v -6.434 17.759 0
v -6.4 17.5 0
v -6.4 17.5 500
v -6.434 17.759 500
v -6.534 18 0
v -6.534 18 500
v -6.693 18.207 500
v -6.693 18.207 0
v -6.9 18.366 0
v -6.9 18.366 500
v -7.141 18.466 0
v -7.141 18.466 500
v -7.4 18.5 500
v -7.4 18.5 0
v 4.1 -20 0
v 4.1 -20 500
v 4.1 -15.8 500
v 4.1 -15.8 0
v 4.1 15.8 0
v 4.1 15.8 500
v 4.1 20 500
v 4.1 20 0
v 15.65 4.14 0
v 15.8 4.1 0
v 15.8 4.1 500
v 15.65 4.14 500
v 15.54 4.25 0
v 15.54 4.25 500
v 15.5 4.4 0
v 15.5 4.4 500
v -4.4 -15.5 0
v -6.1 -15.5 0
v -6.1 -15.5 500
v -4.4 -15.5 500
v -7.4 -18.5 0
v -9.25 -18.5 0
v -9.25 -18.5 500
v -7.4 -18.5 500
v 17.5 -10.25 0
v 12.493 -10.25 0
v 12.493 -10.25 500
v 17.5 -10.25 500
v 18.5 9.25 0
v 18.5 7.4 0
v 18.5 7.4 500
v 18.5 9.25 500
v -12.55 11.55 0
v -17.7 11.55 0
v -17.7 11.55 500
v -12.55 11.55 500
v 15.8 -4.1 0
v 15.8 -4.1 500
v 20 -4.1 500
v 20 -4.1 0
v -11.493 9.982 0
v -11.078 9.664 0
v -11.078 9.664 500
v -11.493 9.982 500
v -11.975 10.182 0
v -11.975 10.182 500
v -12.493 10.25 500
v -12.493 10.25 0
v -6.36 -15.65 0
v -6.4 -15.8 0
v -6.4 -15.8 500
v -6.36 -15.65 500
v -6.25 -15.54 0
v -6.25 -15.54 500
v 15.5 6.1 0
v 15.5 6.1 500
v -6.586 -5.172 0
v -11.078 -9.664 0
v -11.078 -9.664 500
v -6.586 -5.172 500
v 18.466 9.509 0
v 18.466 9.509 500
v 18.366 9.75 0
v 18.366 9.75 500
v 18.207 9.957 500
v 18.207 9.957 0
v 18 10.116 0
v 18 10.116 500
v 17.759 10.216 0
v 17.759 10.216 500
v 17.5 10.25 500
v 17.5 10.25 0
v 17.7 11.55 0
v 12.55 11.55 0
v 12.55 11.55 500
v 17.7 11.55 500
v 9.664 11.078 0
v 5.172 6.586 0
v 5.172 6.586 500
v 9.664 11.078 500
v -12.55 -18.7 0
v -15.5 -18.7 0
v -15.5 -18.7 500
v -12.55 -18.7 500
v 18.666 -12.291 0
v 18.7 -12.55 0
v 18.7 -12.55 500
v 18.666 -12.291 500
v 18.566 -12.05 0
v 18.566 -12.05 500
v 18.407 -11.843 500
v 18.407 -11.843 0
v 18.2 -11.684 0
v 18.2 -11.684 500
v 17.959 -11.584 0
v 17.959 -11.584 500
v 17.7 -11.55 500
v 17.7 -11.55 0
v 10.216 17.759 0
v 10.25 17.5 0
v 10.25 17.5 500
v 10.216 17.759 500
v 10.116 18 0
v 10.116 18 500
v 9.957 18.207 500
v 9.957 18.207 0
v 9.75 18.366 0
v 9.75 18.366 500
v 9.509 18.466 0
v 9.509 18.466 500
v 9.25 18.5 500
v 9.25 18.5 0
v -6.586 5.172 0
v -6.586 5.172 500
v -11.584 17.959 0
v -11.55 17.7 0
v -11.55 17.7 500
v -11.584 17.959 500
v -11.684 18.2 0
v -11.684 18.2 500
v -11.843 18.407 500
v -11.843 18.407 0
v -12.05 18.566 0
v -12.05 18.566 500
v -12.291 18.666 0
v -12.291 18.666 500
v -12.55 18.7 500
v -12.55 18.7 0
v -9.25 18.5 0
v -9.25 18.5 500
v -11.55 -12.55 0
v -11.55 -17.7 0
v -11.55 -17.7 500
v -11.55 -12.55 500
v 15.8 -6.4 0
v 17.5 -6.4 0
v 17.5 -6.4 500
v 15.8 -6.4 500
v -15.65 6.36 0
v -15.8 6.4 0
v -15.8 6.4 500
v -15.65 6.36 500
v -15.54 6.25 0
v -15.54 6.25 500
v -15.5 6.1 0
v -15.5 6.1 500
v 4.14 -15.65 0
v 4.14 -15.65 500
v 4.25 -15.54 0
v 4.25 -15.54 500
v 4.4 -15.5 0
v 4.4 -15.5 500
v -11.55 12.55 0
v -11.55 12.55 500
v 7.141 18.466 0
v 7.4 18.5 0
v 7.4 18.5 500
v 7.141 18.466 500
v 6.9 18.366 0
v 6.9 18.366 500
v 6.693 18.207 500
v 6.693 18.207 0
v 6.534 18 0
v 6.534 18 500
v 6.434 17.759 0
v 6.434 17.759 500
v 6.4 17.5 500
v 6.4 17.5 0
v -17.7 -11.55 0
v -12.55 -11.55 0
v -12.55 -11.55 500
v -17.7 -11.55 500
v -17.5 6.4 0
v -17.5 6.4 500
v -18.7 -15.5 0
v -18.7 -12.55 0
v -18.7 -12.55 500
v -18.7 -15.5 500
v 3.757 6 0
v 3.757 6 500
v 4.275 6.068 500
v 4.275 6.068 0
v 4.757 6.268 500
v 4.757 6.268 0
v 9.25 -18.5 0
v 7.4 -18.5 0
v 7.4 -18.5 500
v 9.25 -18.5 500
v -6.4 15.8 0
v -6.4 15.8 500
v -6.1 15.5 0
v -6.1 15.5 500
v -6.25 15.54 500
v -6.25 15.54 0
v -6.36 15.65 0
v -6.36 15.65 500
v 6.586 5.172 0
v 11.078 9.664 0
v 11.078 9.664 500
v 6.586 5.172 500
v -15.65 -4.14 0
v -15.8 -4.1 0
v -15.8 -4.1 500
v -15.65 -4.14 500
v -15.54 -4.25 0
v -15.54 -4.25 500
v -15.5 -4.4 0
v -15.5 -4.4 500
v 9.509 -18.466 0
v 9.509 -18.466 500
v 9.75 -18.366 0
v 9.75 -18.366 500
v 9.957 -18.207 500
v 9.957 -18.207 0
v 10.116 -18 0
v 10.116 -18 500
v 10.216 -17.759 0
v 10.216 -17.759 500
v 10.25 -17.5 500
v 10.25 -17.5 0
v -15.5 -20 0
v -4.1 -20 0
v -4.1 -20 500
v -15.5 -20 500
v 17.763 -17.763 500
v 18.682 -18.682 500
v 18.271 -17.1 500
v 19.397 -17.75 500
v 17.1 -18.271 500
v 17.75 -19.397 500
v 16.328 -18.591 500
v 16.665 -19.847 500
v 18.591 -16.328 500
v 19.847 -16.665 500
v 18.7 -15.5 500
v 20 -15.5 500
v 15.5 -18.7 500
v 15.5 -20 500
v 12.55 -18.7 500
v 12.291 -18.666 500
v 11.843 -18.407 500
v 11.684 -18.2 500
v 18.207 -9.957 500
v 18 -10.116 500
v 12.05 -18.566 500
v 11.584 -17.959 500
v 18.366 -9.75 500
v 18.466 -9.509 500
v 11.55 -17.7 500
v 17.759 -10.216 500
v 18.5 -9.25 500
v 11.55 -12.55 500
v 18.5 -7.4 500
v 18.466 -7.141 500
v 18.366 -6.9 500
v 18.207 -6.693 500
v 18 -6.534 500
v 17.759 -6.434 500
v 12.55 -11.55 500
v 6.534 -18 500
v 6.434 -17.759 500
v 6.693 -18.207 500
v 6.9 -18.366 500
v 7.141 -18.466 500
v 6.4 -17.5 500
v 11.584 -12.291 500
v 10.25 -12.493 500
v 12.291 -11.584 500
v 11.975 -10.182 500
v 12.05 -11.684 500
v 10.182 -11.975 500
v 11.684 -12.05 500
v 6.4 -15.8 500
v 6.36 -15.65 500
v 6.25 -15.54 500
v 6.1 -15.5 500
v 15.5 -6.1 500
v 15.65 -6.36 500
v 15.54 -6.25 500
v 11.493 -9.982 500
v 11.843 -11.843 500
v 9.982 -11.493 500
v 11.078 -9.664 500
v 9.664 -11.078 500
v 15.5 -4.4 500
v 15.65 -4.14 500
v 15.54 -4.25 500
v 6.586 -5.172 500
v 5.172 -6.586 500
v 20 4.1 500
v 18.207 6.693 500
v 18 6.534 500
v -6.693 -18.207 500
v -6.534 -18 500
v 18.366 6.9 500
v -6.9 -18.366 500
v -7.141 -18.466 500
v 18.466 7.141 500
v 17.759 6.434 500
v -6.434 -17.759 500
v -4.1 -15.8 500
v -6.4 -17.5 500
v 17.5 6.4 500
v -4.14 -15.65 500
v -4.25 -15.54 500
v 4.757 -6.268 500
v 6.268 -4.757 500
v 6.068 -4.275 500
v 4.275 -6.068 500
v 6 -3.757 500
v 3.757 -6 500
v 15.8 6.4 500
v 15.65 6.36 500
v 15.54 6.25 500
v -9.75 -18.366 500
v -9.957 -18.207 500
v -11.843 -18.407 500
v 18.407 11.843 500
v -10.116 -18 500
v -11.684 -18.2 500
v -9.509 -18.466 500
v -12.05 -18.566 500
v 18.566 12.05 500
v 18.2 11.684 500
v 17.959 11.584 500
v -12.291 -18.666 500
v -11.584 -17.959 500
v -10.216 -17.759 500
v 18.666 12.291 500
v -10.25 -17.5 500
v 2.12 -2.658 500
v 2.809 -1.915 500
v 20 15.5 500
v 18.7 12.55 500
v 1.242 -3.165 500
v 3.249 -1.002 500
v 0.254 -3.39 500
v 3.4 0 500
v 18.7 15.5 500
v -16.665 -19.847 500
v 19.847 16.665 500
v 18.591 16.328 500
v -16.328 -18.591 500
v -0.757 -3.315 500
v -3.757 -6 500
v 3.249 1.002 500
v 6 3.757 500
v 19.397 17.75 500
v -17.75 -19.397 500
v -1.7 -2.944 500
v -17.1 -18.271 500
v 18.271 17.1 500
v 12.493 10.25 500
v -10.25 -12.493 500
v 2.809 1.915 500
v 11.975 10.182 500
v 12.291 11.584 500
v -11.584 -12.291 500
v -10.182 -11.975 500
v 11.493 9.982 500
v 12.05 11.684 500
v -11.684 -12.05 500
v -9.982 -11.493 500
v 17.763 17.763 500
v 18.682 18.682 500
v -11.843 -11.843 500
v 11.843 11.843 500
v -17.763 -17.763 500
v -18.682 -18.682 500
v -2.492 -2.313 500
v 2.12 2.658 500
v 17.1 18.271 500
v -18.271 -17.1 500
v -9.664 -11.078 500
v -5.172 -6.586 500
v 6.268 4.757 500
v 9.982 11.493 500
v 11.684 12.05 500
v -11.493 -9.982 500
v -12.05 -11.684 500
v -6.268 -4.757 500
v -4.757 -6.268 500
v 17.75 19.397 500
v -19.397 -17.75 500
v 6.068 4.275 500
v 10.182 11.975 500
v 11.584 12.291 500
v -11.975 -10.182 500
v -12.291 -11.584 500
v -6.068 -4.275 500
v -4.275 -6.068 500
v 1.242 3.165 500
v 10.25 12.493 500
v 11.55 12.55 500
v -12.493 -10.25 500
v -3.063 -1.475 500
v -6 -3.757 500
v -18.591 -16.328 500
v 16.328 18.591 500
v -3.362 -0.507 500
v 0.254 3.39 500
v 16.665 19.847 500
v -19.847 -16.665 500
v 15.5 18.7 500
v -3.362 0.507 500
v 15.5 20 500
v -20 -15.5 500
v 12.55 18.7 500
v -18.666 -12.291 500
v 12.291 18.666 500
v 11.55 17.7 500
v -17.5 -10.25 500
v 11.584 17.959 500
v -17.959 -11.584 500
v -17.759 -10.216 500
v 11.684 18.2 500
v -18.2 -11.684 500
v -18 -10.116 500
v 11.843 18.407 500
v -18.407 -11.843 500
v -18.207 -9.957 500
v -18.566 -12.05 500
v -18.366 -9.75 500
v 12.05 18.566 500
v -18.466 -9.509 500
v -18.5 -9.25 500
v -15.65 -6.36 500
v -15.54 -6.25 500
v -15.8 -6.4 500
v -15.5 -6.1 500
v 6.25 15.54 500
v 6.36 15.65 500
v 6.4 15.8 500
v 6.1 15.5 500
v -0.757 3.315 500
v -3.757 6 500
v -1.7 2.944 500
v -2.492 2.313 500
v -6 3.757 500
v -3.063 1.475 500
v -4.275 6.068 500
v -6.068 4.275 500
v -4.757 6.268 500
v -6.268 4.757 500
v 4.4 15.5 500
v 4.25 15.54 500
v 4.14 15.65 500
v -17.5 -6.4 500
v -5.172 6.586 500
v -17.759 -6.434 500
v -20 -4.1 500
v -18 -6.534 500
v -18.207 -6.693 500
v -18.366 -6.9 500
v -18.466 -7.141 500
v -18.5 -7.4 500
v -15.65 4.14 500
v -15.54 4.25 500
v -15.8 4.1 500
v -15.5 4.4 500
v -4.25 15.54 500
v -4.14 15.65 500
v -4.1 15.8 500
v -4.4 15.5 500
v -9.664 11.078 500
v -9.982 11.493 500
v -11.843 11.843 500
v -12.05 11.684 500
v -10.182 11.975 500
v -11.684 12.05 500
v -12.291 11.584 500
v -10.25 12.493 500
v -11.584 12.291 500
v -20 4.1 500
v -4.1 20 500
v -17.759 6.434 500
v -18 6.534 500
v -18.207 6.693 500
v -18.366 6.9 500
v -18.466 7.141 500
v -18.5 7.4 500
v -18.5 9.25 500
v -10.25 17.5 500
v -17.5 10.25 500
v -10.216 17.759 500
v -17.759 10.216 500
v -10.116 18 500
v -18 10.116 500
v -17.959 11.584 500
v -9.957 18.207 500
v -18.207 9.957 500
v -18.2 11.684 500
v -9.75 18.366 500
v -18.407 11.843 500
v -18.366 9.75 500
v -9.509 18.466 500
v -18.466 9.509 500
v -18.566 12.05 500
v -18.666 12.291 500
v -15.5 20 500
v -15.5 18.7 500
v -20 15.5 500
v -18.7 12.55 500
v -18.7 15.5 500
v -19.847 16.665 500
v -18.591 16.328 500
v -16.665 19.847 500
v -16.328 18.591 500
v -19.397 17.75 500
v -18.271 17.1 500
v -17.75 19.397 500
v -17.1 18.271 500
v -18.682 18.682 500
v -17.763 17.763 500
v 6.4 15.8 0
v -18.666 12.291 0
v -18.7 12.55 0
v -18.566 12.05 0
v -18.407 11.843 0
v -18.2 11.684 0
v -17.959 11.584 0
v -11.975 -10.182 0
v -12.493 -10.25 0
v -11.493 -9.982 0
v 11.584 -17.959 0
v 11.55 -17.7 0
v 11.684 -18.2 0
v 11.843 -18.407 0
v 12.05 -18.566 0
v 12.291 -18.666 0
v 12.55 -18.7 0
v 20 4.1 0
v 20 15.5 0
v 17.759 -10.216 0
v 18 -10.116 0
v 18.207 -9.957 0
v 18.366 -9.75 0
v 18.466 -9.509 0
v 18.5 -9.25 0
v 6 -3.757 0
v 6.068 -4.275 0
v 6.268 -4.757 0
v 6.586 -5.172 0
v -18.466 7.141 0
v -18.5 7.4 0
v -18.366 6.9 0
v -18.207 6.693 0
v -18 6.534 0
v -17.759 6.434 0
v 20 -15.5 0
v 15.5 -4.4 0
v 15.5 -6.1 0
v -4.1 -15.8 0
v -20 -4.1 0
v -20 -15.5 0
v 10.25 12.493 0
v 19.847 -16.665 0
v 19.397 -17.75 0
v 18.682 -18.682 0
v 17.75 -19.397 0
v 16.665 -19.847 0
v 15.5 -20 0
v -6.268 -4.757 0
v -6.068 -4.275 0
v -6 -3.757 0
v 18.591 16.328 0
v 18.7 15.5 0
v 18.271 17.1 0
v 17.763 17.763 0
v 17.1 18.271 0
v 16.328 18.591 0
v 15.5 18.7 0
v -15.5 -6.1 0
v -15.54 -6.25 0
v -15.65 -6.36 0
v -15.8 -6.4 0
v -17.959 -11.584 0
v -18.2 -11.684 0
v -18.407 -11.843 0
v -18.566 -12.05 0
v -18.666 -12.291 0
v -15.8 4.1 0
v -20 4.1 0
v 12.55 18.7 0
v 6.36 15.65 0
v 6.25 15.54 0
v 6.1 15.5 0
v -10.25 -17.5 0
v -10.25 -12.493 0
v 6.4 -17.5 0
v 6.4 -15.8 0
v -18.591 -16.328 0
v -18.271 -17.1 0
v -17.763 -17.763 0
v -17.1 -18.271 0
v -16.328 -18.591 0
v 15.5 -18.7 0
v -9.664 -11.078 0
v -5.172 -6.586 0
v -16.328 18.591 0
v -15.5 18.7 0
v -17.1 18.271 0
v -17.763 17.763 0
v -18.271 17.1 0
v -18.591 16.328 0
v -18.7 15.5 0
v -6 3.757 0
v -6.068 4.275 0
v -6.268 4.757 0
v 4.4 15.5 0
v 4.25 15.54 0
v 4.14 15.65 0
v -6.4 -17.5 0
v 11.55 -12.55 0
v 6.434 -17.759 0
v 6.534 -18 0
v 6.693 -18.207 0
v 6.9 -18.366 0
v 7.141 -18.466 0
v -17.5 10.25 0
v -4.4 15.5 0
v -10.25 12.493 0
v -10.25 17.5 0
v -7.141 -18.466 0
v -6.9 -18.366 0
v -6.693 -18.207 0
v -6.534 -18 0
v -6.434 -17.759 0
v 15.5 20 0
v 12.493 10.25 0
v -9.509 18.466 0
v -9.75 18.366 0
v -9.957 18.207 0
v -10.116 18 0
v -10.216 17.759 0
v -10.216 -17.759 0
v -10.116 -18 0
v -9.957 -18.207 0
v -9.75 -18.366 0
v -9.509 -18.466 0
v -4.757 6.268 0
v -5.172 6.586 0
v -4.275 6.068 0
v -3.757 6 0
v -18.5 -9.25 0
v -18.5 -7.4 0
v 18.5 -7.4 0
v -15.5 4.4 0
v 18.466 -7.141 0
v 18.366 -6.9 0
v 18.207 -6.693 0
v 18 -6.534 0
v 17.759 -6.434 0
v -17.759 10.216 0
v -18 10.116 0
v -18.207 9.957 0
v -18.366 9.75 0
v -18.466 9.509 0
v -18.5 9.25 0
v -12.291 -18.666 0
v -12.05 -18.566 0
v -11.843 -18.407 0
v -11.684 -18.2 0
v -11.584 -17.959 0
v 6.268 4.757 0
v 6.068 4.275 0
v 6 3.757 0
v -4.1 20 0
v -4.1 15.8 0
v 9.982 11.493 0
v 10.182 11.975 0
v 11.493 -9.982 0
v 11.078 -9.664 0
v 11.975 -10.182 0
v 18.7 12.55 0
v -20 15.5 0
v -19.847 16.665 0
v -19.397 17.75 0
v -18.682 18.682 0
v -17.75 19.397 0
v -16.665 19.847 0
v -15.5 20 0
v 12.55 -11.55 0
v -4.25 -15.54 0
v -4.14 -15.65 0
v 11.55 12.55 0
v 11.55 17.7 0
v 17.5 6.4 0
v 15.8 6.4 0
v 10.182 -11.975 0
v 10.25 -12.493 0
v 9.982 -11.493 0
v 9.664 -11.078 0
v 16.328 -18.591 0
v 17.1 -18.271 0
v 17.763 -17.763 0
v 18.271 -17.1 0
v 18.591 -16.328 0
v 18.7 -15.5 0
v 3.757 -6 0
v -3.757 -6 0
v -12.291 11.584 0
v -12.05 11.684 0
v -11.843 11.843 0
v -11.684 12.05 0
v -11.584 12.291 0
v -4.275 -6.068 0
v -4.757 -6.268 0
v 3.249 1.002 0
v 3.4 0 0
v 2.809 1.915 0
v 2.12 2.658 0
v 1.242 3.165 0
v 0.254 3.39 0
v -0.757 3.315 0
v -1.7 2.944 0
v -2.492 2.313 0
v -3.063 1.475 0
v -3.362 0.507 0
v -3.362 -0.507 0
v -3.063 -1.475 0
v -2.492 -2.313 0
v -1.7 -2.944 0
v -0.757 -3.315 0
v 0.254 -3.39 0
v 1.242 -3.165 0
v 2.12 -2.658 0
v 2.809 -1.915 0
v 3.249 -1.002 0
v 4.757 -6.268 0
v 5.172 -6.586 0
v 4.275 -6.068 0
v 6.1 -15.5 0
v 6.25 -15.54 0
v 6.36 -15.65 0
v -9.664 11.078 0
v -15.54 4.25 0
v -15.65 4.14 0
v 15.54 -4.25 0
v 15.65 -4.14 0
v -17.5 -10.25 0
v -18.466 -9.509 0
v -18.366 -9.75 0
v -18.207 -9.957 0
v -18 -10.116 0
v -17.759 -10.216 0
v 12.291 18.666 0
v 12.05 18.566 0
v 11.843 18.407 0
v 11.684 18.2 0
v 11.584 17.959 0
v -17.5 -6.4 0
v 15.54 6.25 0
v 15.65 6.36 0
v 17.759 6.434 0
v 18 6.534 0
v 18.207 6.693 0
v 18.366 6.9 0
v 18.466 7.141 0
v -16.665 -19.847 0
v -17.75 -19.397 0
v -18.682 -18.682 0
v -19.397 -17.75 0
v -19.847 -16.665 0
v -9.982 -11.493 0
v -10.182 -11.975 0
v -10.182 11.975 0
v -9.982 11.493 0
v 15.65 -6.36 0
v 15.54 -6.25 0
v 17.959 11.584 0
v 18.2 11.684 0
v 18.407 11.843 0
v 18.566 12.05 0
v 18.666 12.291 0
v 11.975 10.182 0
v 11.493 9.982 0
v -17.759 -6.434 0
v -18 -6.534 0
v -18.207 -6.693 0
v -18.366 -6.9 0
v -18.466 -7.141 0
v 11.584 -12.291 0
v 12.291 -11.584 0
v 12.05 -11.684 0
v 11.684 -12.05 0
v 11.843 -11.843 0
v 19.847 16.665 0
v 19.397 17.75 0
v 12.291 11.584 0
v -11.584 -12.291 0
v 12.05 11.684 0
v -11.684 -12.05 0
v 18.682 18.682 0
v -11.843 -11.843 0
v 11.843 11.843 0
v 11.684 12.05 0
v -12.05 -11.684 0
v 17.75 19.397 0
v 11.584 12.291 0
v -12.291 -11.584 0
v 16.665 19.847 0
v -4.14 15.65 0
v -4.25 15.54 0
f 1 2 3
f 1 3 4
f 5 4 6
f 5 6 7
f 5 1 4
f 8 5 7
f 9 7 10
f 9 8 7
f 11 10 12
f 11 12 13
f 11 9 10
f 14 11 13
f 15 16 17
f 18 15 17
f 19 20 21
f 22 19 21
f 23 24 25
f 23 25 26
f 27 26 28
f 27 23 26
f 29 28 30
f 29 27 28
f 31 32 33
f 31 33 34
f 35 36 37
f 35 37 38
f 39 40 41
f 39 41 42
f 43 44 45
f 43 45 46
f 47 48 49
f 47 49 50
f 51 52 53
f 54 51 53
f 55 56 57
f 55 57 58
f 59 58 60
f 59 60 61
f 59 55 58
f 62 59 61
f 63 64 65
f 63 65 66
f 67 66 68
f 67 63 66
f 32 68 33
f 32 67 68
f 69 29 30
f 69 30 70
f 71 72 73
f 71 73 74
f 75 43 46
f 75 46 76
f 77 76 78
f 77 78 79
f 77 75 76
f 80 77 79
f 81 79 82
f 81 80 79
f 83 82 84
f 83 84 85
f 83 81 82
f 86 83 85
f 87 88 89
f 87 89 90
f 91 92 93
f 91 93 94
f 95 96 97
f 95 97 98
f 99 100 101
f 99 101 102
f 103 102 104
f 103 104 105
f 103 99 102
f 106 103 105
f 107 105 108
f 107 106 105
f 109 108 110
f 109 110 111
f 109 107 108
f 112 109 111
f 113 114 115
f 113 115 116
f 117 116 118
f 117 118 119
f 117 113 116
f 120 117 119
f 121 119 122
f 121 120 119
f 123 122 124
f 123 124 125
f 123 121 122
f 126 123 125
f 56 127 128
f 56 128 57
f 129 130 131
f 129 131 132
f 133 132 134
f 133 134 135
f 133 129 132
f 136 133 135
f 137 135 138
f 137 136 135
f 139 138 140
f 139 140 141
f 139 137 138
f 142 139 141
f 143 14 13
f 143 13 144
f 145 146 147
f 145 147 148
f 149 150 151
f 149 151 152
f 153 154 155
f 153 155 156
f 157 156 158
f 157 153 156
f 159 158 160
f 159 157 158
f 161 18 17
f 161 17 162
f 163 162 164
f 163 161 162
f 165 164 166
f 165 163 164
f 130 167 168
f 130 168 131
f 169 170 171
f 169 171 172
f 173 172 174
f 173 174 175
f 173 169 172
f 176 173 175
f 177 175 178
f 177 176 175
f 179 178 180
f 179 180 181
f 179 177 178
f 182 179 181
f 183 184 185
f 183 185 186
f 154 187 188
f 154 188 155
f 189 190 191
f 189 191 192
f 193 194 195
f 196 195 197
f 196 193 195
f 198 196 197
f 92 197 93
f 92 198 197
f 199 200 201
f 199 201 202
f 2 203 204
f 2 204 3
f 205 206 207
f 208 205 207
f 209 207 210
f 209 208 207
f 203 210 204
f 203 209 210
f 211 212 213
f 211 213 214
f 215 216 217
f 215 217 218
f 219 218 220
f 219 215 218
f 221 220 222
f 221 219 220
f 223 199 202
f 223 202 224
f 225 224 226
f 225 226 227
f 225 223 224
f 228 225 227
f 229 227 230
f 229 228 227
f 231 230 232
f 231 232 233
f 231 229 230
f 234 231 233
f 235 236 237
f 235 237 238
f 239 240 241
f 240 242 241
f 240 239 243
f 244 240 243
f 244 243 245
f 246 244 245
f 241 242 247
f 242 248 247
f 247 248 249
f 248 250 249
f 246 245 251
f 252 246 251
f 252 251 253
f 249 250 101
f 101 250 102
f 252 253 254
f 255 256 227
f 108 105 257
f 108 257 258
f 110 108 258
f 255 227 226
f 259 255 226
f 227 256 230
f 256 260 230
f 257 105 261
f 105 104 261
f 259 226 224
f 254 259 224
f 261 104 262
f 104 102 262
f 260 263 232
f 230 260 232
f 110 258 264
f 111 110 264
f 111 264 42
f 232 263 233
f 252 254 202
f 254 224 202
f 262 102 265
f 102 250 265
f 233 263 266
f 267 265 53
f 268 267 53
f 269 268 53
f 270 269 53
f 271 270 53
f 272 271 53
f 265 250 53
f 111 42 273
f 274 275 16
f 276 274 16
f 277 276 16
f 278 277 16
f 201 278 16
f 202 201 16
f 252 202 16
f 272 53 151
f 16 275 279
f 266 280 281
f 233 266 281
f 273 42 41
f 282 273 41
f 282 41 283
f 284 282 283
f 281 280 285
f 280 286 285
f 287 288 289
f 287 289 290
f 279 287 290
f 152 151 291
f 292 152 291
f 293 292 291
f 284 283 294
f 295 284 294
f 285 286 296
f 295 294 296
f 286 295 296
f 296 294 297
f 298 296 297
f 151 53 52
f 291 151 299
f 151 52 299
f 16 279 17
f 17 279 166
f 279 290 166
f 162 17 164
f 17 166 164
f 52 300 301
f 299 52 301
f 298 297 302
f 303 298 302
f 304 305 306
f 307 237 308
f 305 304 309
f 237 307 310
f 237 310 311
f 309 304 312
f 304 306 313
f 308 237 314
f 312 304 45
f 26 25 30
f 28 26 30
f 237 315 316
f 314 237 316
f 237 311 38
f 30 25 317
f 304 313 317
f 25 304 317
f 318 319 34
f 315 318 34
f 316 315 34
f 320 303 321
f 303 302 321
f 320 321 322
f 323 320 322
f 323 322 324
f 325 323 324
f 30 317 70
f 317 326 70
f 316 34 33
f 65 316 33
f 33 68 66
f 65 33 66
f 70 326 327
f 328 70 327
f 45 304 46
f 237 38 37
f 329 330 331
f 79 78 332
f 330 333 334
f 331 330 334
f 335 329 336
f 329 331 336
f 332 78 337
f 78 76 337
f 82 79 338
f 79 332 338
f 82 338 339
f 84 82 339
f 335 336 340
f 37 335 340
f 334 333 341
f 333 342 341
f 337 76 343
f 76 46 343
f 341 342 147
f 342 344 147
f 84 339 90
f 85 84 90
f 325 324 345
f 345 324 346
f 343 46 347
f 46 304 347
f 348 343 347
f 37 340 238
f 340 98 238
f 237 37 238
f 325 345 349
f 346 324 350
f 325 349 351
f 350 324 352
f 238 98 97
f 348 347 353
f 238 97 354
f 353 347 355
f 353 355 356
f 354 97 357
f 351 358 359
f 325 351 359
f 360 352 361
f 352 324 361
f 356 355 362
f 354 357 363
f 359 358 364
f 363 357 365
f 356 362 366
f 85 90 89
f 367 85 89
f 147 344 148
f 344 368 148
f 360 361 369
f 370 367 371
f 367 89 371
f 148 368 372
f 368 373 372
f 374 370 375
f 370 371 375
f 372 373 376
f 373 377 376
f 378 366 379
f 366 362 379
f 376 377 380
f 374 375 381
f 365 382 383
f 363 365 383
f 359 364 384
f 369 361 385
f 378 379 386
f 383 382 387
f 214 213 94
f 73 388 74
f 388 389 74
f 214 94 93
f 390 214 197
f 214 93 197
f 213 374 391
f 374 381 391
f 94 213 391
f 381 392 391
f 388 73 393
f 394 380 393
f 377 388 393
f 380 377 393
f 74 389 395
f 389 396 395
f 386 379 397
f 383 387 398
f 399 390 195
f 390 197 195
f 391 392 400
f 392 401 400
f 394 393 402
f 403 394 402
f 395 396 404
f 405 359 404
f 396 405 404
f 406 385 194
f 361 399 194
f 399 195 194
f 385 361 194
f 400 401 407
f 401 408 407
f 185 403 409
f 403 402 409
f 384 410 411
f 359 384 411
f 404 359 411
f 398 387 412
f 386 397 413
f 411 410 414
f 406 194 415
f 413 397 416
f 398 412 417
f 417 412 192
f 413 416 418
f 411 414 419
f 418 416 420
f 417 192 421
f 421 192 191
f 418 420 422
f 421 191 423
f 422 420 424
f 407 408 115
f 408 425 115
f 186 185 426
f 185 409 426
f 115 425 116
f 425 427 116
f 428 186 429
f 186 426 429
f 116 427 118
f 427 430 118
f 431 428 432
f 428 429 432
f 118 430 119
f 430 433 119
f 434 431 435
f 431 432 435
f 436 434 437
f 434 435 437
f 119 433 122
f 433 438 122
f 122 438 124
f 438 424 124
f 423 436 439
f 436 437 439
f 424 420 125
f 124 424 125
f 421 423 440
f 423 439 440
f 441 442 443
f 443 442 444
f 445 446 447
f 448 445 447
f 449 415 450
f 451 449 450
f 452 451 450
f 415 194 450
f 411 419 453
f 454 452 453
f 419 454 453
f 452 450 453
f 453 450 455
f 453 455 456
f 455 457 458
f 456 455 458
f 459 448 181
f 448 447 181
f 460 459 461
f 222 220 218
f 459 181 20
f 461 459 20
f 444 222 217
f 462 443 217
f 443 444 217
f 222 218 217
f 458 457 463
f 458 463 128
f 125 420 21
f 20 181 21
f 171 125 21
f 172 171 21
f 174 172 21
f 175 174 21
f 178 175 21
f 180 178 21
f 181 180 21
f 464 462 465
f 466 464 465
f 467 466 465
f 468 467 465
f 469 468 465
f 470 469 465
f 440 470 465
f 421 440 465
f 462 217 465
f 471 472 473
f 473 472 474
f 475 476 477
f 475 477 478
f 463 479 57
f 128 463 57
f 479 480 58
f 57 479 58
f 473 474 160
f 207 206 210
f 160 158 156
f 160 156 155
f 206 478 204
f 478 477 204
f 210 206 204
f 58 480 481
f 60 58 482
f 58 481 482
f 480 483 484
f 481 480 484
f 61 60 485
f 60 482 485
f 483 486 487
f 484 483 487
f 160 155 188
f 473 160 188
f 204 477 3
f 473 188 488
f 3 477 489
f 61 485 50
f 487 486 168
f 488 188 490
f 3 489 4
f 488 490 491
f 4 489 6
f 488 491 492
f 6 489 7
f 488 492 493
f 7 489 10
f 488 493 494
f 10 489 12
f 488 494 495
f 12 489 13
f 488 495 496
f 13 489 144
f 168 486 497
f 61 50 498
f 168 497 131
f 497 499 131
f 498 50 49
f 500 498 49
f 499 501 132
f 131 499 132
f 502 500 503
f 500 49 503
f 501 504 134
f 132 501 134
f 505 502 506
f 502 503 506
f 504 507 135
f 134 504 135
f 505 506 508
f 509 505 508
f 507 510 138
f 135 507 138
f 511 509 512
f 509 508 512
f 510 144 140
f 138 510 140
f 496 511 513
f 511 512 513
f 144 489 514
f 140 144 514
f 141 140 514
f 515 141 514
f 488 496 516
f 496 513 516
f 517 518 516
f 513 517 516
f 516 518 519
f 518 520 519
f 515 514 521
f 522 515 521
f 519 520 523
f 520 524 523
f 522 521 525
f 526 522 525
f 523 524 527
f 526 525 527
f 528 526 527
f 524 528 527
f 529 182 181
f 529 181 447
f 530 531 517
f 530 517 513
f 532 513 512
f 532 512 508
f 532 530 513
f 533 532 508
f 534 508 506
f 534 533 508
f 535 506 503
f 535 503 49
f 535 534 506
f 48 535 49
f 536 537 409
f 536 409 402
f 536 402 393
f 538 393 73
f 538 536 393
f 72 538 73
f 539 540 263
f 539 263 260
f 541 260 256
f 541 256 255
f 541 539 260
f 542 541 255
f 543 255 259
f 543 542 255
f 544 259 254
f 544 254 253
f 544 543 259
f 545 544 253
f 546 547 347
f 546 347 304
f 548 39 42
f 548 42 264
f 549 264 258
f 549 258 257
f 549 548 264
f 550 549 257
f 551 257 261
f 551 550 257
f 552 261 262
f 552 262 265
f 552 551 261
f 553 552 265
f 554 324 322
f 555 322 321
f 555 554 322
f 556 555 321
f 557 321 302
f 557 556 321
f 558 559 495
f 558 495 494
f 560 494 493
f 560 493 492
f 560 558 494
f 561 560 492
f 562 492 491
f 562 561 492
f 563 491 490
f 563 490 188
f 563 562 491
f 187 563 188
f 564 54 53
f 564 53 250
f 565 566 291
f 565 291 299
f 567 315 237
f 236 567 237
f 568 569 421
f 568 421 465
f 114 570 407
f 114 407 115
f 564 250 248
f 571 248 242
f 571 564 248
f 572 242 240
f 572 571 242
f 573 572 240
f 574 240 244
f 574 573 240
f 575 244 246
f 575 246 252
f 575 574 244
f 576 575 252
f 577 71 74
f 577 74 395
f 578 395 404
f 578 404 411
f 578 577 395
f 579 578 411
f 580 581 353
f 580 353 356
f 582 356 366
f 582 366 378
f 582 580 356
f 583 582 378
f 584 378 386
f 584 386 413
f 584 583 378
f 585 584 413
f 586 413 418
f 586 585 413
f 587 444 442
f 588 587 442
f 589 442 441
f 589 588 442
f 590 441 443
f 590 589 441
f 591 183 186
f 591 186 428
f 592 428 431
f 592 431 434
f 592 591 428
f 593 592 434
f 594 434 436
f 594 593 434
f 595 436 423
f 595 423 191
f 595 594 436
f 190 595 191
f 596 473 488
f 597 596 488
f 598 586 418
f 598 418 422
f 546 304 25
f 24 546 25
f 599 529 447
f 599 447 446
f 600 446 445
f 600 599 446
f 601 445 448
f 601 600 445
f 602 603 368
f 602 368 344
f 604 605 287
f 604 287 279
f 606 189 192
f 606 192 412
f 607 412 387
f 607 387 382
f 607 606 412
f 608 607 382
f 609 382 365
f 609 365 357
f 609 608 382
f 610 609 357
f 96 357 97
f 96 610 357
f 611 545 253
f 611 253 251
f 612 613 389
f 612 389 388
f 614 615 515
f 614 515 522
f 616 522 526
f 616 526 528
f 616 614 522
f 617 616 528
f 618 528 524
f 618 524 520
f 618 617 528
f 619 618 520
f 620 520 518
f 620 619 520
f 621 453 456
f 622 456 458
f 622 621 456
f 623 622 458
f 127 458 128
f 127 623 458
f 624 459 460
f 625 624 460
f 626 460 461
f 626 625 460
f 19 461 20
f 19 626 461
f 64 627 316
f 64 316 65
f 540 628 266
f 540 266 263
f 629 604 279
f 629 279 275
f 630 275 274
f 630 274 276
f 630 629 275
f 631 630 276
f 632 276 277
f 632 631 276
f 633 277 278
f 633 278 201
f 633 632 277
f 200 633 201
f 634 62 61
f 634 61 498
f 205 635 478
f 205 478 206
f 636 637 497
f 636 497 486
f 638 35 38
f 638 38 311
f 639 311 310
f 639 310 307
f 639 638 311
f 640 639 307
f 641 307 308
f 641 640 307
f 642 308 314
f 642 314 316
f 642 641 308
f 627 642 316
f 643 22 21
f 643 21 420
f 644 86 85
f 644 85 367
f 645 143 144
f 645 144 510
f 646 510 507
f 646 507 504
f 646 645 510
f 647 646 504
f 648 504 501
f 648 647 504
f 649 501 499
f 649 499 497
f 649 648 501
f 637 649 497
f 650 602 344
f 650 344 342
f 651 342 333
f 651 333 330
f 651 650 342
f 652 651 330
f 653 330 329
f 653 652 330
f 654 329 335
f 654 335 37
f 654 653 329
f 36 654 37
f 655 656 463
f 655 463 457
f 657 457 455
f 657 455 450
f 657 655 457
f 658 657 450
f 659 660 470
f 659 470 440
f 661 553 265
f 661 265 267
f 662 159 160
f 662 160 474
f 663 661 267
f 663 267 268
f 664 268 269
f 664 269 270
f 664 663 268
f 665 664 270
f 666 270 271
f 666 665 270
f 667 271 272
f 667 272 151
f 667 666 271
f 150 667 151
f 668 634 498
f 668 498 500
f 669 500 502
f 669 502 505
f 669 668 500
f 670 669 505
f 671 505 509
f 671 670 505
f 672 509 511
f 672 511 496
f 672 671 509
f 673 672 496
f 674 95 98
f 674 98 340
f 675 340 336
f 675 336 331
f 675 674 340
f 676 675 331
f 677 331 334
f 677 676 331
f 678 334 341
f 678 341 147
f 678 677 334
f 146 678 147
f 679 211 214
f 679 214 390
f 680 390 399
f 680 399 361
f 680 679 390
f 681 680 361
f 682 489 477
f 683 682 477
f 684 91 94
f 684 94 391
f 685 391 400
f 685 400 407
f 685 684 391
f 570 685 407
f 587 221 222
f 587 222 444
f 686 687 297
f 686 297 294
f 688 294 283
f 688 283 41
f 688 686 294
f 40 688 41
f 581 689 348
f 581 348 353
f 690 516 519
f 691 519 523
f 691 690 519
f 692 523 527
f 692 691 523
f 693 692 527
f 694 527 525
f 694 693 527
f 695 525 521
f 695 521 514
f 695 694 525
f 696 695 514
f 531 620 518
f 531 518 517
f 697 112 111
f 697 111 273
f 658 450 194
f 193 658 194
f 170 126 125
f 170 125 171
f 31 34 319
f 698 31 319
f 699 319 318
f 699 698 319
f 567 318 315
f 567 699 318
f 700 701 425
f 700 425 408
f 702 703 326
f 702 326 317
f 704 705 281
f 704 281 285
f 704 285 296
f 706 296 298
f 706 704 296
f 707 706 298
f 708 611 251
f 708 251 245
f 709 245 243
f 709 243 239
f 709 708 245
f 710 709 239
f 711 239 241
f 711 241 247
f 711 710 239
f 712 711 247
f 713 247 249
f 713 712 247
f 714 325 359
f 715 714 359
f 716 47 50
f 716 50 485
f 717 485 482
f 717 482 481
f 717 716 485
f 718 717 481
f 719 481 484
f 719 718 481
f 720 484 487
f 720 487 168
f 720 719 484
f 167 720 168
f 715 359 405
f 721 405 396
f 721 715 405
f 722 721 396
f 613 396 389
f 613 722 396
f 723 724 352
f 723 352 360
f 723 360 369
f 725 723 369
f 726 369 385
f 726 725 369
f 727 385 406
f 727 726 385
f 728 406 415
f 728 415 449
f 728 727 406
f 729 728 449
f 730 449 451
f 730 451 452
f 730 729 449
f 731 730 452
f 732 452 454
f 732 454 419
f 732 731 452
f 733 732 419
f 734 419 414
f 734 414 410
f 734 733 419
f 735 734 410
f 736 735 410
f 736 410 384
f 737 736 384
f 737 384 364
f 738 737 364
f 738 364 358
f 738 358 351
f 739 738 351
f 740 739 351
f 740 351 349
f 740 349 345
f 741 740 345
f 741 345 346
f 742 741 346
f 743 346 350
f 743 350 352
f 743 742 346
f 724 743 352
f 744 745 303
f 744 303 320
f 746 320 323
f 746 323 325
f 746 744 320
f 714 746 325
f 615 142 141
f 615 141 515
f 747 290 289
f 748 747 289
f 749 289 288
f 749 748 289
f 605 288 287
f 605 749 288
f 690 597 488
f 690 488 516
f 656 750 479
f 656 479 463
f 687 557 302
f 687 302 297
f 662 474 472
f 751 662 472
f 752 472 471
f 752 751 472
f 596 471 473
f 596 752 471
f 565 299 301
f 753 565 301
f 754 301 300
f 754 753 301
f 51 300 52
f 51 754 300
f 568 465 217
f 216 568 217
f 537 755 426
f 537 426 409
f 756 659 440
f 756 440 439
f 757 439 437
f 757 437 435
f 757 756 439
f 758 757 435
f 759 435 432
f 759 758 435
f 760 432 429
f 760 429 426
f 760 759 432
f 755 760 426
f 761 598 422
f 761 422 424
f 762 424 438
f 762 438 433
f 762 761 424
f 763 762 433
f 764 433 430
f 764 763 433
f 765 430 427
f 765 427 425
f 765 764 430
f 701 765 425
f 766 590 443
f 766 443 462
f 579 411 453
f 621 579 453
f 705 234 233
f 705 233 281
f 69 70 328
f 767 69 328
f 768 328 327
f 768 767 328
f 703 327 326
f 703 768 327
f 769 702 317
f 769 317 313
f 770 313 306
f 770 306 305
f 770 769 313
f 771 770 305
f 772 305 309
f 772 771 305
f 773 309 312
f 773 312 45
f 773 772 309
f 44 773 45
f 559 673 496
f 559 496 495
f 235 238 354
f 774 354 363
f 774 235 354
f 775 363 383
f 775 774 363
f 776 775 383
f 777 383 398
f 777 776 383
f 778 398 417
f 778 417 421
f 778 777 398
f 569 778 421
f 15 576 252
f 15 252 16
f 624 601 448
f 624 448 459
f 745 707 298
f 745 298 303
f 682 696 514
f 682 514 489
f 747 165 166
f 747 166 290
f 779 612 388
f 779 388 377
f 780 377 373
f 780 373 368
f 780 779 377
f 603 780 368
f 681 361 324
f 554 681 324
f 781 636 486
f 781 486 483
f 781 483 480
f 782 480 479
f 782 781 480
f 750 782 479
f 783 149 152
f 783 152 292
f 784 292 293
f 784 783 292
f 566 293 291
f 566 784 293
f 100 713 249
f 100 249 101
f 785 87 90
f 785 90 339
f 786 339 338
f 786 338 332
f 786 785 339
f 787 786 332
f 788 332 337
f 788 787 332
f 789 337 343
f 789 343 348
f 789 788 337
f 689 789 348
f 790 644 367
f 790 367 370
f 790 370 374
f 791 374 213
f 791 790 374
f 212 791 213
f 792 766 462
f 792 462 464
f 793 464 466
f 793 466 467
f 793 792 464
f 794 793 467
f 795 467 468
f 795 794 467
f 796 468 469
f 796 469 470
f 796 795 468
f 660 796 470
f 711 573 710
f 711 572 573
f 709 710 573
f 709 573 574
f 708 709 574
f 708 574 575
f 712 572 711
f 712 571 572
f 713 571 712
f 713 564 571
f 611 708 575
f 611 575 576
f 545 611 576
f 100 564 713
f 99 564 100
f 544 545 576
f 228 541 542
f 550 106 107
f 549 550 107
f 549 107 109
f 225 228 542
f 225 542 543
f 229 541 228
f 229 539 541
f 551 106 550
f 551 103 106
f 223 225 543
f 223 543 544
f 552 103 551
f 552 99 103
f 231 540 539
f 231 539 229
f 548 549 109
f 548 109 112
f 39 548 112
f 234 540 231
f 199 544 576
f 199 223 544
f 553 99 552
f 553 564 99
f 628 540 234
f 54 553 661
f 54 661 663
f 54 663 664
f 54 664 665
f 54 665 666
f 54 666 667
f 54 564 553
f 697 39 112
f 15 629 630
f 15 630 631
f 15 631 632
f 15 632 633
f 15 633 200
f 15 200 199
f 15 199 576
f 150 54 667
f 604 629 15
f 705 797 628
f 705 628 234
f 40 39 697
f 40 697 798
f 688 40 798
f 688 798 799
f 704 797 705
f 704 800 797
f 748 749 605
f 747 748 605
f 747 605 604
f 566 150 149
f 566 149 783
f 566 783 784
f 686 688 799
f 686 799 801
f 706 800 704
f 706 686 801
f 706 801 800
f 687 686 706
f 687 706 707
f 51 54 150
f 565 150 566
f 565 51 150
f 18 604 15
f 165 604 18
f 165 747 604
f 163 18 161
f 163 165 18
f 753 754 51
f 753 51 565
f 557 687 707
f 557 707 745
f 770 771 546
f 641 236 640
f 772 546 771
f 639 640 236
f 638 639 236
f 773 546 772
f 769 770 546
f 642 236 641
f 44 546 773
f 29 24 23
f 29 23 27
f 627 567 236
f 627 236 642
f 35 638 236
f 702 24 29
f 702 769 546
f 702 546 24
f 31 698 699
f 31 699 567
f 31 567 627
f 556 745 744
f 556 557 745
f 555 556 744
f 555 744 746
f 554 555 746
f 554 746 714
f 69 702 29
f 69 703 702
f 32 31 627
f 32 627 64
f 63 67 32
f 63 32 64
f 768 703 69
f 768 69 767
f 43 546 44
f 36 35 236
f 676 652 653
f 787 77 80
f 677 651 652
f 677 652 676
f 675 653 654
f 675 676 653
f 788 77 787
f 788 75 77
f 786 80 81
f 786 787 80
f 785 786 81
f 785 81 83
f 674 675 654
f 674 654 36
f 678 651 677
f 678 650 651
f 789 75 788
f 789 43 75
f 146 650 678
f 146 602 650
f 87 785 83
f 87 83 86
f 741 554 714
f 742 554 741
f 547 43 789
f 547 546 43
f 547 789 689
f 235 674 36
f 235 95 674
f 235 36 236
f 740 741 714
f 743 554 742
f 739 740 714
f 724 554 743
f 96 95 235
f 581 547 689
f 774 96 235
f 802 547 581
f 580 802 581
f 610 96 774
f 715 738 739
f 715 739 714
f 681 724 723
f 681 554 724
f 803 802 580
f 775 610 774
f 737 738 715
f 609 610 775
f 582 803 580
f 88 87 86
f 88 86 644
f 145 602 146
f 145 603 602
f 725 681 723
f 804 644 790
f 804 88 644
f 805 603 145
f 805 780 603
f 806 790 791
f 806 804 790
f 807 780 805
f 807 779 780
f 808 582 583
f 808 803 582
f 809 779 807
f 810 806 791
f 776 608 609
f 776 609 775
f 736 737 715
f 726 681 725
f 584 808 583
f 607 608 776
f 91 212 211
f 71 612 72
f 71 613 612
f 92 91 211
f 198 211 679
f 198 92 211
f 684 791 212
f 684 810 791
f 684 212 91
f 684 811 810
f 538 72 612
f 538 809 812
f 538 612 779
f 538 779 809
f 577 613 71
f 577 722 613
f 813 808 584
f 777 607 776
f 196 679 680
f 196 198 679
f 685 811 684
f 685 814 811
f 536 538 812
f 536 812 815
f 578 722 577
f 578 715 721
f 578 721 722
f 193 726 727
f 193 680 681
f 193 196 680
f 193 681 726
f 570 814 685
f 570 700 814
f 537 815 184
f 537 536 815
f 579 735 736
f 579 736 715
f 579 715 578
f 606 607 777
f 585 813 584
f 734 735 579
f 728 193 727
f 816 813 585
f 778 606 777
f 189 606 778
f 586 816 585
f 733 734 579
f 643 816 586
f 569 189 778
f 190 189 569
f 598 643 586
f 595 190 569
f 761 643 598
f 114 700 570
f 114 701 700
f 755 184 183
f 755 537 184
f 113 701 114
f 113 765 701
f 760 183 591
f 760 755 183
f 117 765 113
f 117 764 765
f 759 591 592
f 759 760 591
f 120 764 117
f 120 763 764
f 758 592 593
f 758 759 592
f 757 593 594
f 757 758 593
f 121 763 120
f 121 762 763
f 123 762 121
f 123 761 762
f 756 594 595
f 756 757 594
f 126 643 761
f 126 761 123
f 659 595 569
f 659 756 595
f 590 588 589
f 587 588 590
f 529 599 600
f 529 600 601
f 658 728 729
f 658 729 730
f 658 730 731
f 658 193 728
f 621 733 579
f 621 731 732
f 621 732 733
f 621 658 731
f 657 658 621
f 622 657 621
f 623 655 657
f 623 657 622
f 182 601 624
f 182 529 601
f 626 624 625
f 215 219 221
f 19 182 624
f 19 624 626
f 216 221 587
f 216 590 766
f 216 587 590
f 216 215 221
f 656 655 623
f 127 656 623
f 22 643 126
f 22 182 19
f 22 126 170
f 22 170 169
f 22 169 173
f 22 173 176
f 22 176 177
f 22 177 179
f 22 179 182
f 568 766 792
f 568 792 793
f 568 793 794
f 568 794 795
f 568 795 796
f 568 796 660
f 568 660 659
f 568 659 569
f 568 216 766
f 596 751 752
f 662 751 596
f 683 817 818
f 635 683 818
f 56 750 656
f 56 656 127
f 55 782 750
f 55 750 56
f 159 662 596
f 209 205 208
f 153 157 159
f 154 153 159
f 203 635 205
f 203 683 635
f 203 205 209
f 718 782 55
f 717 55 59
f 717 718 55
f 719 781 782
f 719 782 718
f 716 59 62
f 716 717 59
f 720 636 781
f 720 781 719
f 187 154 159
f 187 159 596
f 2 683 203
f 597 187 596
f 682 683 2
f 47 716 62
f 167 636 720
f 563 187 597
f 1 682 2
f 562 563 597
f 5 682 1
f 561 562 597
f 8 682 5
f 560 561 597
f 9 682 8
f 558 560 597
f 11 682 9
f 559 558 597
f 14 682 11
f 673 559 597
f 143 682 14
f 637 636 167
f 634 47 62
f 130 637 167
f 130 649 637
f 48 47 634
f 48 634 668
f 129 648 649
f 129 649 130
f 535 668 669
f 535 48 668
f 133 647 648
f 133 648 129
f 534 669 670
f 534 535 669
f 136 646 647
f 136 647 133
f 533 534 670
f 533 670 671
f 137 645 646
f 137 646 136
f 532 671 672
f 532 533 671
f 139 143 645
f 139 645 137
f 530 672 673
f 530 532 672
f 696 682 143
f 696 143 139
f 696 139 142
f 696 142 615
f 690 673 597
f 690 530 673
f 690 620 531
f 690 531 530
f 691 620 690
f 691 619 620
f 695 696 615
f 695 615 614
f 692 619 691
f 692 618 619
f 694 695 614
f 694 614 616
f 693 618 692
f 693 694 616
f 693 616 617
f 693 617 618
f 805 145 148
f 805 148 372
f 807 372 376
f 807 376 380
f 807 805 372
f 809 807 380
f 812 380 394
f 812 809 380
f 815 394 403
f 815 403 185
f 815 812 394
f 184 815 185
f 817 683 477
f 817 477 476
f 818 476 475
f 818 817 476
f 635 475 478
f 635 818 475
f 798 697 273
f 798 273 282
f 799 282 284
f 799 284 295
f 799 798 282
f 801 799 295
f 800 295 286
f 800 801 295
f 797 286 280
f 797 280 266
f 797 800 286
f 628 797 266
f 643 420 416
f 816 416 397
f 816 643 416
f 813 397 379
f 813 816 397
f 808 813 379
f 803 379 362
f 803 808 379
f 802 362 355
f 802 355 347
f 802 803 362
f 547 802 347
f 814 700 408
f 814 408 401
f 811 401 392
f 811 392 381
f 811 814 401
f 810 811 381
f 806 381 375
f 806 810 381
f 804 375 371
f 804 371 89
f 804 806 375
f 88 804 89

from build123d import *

# Parameters (mm, degrees)
SKETCH1_R           = 3.4
BOSS_EXTRUDE1_DEPTH = 500


with BuildPart() as part:
    # Sketch1 → Boss-Extrude1 (new body)
    with BuildSketch(Plane.XY):
        with BuildLine():
            Line((-20, 4.1), (-20, 15.5))
            ThreePointArc((-20, 15.5), (-18.681980515, 18.681980515), (-15.5, 20))
            Line((-15.5, 20), (-4.1, 20))
            Line((-4.1, 20), (-4.1, 15.8))
            ThreePointArc((-4.1, 15.8), (-4.187867966, 15.587867966), (-4.4, 15.5))
            Line((-4.4, 15.5), (-6.1, 15.5))
            ThreePointArc((-6.1, 15.5), (-6.312132034, 15.587867966), (-6.4, 15.8))
            Line((-6.4, 15.8), (-6.4, 17.5))
            ThreePointArc((-6.4, 17.5), (-6.692893219, 18.207106781), (-7.4, 18.5))
            Line((-7.4, 18.5), (-9.25, 18.5))
            ThreePointArc((-9.25, 18.5), (-9.957106781, 18.207106781), (-10.25, 17.5))
            Line((-10.25, 17.5), (-10.25, 12.492640687))
            ThreePointArc((-10.25, 12.492640687), (-10.097759065, 11.727273822), (-9.664213562, 11.078427125))
            Line((-9.664213562, 11.078427125), (-5.171572875, 6.585786438))
            ThreePointArc((-5.171572875, 6.585786438), (-4.522726178, 6.152240935), (-3.757359313, 6))
            Line((-3.757359313, 6), (3.757359313, 6))
            ThreePointArc((3.757359313, 6), (4.522726178, 6.152240935), (5.171572875, 6.585786438))
            Line((5.171572875, 6.585786438), (9.664213562, 11.078427125))
            ThreePointArc((9.664213562, 11.078427125), (10.097759065, 11.727273822), (10.25, 12.492640687))
            Line((10.25, 12.492640687), (10.25, 17.5))
            ThreePointArc((10.25, 17.5), (9.957106781, 18.207106781), (9.25, 18.5))
            Line((9.25, 18.5), (7.4, 18.5))
            ThreePointArc((7.4, 18.5), (6.692893219, 18.207106781), (6.4, 17.5))
            Line((6.4, 17.5), (6.4, 15.8))
            ThreePointArc((6.4, 15.8), (6.312132034, 15.587867966), (6.1, 15.5))
            Line((6.1, 15.5), (4.4, 15.5))
            ThreePointArc((4.4, 15.5), (4.187867966, 15.587867966), (4.1, 15.8))
            Line((4.1, 15.8), (4.1, 20))
            Line((4.1, 20), (15.5, 20))
            ThreePointArc((15.5, 20), (18.681980515, 18.681980515), (20, 15.5))
            Line((20, 15.5), (20, 4.1))
            Line((20, 4.1), (15.8, 4.1))
            ThreePointArc((15.8, 4.1), (15.587867966, 4.187867966), (15.5, 4.4))
            Line((15.5, 4.4), (15.5, 6.1))
            ThreePointArc((15.5, 6.1), (15.587867966, 6.312132034), (15.8, 6.4))
            Line((15.8, 6.4), (17.5, 6.4))
            ThreePointArc((17.5, 6.4), (18.207106781, 6.692893219), (18.5, 7.4))
            Line((18.5, 7.4), (18.5, 9.25))
            ThreePointArc((18.5, 9.25), (18.207106781, 9.957106781), (17.5, 10.25))
            Line((17.5, 10.25), (12.492640687, 10.25))
            ThreePointArc((12.492640687, 10.25), (11.727273822, 10.097759065), (11.078427125, 9.664213562))
            Line((11.078427125, 9.664213562), (6.585786438, 5.171572875))
            ThreePointArc((6.585786438, 5.171572875), (6.152240935, 4.522726178), (6, 3.757359313))
            Line((6, 3.757359313), (6, -3.757359313))
            ThreePointArc((6, -3.757359313), (6.152240935, -4.522726178), (6.585786438, -5.171572875))
            Line((6.585786438, -5.171572875), (11.078427125, -9.664213562))
            ThreePointArc((11.078427125, -9.664213562), (11.727273822, -10.097759065), (12.492640687, -10.25))
            Line((12.492640687, -10.25), (17.5, -10.25))
            ThreePointArc((17.5, -10.25), (18.207106781, -9.957106781), (18.5, -9.25))
            Line((18.5, -9.25), (18.5, -7.4))
            ThreePointArc((18.5, -7.4), (18.207106781, -6.692893219), (17.5, -6.4))
            Line((17.5, -6.4), (15.8, -6.4))
            ThreePointArc((15.8, -6.4), (15.587867966, -6.312132034), (15.5, -6.1))
            Line((15.5, -6.1), (15.5, -4.4))
            ThreePointArc((15.5, -4.4), (15.587867966, -4.187867966), (15.8, -4.1))
            Line((15.8, -4.1), (20, -4.1))
            Line((20, -4.1), (20, -15.5))
            ThreePointArc((20, -15.5), (18.681980515, -18.681980515), (15.5, -20))
            Line((15.5, -20), (4.1, -20))
            Line((4.1, -20), (4.1, -15.8))
            ThreePointArc((4.1, -15.8), (4.187867966, -15.587867966), (4.4, -15.5))
            Line((4.4, -15.5), (6.1, -15.5))
            ThreePointArc((6.1, -15.5), (6.312132034, -15.587867966), (6.4, -15.8))
            Line((6.4, -15.8), (6.4, -17.5))
            ThreePointArc((6.4, -17.5), (6.692893219, -18.207106781), (7.4, -18.5))
            Line((7.4, -18.5), (9.25, -18.5))
            ThreePointArc((9.25, -18.5), (9.957106781, -18.207106781), (10.25, -17.5))
            Line((10.25, -17.5), (10.25, -12.492640687))
            ThreePointArc((10.25, -12.492640687), (10.097759065, -11.727273822), (9.664213562, -11.078427125))
            Line((9.664213562, -11.078427125), (5.171572875, -6.585786438))
            ThreePointArc((5.171572875, -6.585786438), (4.522726178, -6.152240935), (3.757359313, -6))
            Line((3.757359313, -6), (-3.757359313, -6))
            ThreePointArc((-3.757359313, -6), (-4.522726178, -6.152240935), (-5.171572875, -6.585786438))
            Line((-5.171572875, -6.585786438), (-9.664213562, -11.078427125))
            ThreePointArc((-9.664213562, -11.078427125), (-10.097759065, -11.727273822), (-10.25, -12.492640687))
            Line((-10.25, -12.492640687), (-10.25, -17.5))
            ThreePointArc((-10.25, -17.5), (-9.957106781, -18.207106781), (-9.25, -18.5))
            Line((-9.25, -18.5), (-7.4, -18.5))
            ThreePointArc((-7.4, -18.5), (-6.692893219, -18.207106781), (-6.4, -17.5))
            Line((-6.4, -17.5), (-6.4, -15.8))
            ThreePointArc((-6.4, -15.8), (-6.312132034, -15.587867966), (-6.1, -15.5))
            Line((-6.1, -15.5), (-4.4, -15.5))
            ThreePointArc((-4.4, -15.5), (-4.187867966, -15.587867966), (-4.1, -15.8))
            Line((-4.1, -15.8), (-4.1, -20))
            Line((-4.1, -20), (-15.5, -20))
            ThreePointArc((-15.5, -20), (-18.681980515, -18.681980515), (-20, -15.5))
            Line((-20, -15.5), (-20, -4.1))
            Line((-20, -4.1), (-15.8, -4.1))
            ThreePointArc((-15.8, -4.1), (-15.587867966, -4.187867966), (-15.5, -4.4))
            Line((-15.5, -4.4), (-15.5, -6.1))
            ThreePointArc((-15.5, -6.1), (-15.587867966, -6.312132034), (-15.8, -6.4))
            Line((-15.8, -6.4), (-17.5, -6.4))
            ThreePointArc((-17.5, -6.4), (-18.207106781, -6.692893219), (-18.5, -7.4))
            Line((-18.5, -7.4), (-18.5, -9.25))
            ThreePointArc((-18.5, -9.25), (-18.207106781, -9.957106781), (-17.5, -10.25))
            Line((-17.5, -10.25), (-12.492640687, -10.25))
            ThreePointArc((-12.492640687, -10.25), (-11.727273822, -10.097759065), (-11.078427125, -9.664213562))
            Line((-11.078427125, -9.664213562), (-6.585786438, -5.171572875))
            ThreePointArc((-6.585786438, -5.171572875), (-6.152240935, -4.522726178), (-6, -3.757359313))
            Line((-6, -3.757359313), (-6, 3.757359313))
            ThreePointArc((-6, 3.757359313), (-6.152240935, 4.522726178), (-6.585786438, 5.171572875))
            Line((-6.585786438, 5.171572875), (-11.078427125, 9.664213562))
            ThreePointArc((-11.078427125, 9.664213562), (-11.727273822, 10.097759065), (-12.492640687, 10.25))
            Line((-12.492640687, 10.25), (-17.5, 10.25))
            ThreePointArc((-17.5, 10.25), (-18.207106781, 9.957106781), (-18.5, 9.25))
            Line((-18.5, 9.25), (-18.5, 7.4))
            ThreePointArc((-18.5, 7.4), (-18.207106781, 6.692893219), (-17.5, 6.4))
            Line((-17.5, 6.4), (-15.8, 6.4))
            ThreePointArc((-15.8, 6.4), (-15.587867966, 6.312132034), (-15.5, 6.1))
            Line((-15.5, 6.1), (-15.5, 4.4))
            ThreePointArc((-15.5, 4.4), (-15.587867966, 4.187867966), (-15.8, 4.1))
            Line((-15.8, 4.1), (-20, 4.1))
        make_face()
        Circle(SKETCH1_R, mode=Mode.SUBTRACT)
        with BuildLine():
            Line((18.7, 12.55), (18.7, 15.5))
            ThreePointArc((18.7, 15.5), (17.7627417, 17.7627417), (15.5, 18.7))
            Line((15.5, 18.7), (12.55, 18.7))
            ThreePointArc((12.55, 18.7), (11.842893219, 18.407106781), (11.55, 17.7))
            Line((11.55, 17.7), (11.55, 12.55))
            ThreePointArc((11.55, 12.55), (11.842893219, 11.842893219), (12.55, 11.55))
            Line((12.55, 11.55), (17.7, 11.55))
            ThreePointArc((17.7, 11.55), (18.407106781, 11.842893219), (18.7, 12.55))
        make_face(mode=Mode.SUBTRACT)
        with BuildLine():
            Line((-18.7, -12.55), (-18.7, -15.5))
            ThreePointArc((-18.7, -15.5), (-17.7627417, -17.7627417), (-15.5, -18.7))
            Line((-15.5, -18.7), (-12.55, -18.7))
            ThreePointArc((-12.55, -18.7), (-11.842893219, -18.407106781), (-11.55, -17.7))
            Line((-11.55, -17.7), (-11.55, -12.55))
            ThreePointArc((-11.55, -12.55), (-11.842893219, -11.842893219), (-12.55, -11.55))
            Line((-12.55, -11.55), (-17.7, -11.55))
            ThreePointArc((-17.7, -11.55), (-18.407106781, -11.842893219), (-18.7, -12.55))
        make_face(mode=Mode.SUBTRACT)
        with BuildLine():
            Line((-12.55, 18.7), (-15.5, 18.7))
            ThreePointArc((-15.5, 18.7), (-17.7627417, 17.7627417), (-18.7, 15.5))
            Line((-18.7, 15.5), (-18.7, 12.55))
            ThreePointArc((-18.7, 12.55), (-18.407106781, 11.842893219), (-17.7, 11.55))
            Line((-17.7, 11.55), (-12.55, 11.55))
            ThreePointArc((-12.55, 11.55), (-11.842893219, 11.842893219), (-11.55, 12.55))
            Line((-11.55, 12.55), (-11.55, 17.7))
            ThreePointArc((-11.55, 17.7), (-11.842893219, 18.407106781), (-12.55, 18.7))
        make_face(mode=Mode.SUBTRACT)
        with BuildLine():
            Line((12.55, -18.7), (15.5, -18.7))
            ThreePointArc((15.5, -18.7), (17.7627417, -17.7627417), (18.7, -15.5))
            Line((18.7, -15.5), (18.7, -12.55))
            ThreePointArc((18.7, -12.55), (18.407106781, -11.842893219), (17.7, -11.55))
            Line((17.7, -11.55), (12.55, -11.55))
            ThreePointArc((12.55, -11.55), (11.842893219, -11.842893219), (11.55, -12.55))
            Line((11.55, -12.55), (11.55, -17.7))
            ThreePointArc((11.55, -17.7), (11.842893219, -18.407106781), (12.55, -18.7))
        make_face(mode=Mode.SUBTRACT)
    extrude(amount=BOSS_EXTRUDE1_DEPTH)


solid = part.part
